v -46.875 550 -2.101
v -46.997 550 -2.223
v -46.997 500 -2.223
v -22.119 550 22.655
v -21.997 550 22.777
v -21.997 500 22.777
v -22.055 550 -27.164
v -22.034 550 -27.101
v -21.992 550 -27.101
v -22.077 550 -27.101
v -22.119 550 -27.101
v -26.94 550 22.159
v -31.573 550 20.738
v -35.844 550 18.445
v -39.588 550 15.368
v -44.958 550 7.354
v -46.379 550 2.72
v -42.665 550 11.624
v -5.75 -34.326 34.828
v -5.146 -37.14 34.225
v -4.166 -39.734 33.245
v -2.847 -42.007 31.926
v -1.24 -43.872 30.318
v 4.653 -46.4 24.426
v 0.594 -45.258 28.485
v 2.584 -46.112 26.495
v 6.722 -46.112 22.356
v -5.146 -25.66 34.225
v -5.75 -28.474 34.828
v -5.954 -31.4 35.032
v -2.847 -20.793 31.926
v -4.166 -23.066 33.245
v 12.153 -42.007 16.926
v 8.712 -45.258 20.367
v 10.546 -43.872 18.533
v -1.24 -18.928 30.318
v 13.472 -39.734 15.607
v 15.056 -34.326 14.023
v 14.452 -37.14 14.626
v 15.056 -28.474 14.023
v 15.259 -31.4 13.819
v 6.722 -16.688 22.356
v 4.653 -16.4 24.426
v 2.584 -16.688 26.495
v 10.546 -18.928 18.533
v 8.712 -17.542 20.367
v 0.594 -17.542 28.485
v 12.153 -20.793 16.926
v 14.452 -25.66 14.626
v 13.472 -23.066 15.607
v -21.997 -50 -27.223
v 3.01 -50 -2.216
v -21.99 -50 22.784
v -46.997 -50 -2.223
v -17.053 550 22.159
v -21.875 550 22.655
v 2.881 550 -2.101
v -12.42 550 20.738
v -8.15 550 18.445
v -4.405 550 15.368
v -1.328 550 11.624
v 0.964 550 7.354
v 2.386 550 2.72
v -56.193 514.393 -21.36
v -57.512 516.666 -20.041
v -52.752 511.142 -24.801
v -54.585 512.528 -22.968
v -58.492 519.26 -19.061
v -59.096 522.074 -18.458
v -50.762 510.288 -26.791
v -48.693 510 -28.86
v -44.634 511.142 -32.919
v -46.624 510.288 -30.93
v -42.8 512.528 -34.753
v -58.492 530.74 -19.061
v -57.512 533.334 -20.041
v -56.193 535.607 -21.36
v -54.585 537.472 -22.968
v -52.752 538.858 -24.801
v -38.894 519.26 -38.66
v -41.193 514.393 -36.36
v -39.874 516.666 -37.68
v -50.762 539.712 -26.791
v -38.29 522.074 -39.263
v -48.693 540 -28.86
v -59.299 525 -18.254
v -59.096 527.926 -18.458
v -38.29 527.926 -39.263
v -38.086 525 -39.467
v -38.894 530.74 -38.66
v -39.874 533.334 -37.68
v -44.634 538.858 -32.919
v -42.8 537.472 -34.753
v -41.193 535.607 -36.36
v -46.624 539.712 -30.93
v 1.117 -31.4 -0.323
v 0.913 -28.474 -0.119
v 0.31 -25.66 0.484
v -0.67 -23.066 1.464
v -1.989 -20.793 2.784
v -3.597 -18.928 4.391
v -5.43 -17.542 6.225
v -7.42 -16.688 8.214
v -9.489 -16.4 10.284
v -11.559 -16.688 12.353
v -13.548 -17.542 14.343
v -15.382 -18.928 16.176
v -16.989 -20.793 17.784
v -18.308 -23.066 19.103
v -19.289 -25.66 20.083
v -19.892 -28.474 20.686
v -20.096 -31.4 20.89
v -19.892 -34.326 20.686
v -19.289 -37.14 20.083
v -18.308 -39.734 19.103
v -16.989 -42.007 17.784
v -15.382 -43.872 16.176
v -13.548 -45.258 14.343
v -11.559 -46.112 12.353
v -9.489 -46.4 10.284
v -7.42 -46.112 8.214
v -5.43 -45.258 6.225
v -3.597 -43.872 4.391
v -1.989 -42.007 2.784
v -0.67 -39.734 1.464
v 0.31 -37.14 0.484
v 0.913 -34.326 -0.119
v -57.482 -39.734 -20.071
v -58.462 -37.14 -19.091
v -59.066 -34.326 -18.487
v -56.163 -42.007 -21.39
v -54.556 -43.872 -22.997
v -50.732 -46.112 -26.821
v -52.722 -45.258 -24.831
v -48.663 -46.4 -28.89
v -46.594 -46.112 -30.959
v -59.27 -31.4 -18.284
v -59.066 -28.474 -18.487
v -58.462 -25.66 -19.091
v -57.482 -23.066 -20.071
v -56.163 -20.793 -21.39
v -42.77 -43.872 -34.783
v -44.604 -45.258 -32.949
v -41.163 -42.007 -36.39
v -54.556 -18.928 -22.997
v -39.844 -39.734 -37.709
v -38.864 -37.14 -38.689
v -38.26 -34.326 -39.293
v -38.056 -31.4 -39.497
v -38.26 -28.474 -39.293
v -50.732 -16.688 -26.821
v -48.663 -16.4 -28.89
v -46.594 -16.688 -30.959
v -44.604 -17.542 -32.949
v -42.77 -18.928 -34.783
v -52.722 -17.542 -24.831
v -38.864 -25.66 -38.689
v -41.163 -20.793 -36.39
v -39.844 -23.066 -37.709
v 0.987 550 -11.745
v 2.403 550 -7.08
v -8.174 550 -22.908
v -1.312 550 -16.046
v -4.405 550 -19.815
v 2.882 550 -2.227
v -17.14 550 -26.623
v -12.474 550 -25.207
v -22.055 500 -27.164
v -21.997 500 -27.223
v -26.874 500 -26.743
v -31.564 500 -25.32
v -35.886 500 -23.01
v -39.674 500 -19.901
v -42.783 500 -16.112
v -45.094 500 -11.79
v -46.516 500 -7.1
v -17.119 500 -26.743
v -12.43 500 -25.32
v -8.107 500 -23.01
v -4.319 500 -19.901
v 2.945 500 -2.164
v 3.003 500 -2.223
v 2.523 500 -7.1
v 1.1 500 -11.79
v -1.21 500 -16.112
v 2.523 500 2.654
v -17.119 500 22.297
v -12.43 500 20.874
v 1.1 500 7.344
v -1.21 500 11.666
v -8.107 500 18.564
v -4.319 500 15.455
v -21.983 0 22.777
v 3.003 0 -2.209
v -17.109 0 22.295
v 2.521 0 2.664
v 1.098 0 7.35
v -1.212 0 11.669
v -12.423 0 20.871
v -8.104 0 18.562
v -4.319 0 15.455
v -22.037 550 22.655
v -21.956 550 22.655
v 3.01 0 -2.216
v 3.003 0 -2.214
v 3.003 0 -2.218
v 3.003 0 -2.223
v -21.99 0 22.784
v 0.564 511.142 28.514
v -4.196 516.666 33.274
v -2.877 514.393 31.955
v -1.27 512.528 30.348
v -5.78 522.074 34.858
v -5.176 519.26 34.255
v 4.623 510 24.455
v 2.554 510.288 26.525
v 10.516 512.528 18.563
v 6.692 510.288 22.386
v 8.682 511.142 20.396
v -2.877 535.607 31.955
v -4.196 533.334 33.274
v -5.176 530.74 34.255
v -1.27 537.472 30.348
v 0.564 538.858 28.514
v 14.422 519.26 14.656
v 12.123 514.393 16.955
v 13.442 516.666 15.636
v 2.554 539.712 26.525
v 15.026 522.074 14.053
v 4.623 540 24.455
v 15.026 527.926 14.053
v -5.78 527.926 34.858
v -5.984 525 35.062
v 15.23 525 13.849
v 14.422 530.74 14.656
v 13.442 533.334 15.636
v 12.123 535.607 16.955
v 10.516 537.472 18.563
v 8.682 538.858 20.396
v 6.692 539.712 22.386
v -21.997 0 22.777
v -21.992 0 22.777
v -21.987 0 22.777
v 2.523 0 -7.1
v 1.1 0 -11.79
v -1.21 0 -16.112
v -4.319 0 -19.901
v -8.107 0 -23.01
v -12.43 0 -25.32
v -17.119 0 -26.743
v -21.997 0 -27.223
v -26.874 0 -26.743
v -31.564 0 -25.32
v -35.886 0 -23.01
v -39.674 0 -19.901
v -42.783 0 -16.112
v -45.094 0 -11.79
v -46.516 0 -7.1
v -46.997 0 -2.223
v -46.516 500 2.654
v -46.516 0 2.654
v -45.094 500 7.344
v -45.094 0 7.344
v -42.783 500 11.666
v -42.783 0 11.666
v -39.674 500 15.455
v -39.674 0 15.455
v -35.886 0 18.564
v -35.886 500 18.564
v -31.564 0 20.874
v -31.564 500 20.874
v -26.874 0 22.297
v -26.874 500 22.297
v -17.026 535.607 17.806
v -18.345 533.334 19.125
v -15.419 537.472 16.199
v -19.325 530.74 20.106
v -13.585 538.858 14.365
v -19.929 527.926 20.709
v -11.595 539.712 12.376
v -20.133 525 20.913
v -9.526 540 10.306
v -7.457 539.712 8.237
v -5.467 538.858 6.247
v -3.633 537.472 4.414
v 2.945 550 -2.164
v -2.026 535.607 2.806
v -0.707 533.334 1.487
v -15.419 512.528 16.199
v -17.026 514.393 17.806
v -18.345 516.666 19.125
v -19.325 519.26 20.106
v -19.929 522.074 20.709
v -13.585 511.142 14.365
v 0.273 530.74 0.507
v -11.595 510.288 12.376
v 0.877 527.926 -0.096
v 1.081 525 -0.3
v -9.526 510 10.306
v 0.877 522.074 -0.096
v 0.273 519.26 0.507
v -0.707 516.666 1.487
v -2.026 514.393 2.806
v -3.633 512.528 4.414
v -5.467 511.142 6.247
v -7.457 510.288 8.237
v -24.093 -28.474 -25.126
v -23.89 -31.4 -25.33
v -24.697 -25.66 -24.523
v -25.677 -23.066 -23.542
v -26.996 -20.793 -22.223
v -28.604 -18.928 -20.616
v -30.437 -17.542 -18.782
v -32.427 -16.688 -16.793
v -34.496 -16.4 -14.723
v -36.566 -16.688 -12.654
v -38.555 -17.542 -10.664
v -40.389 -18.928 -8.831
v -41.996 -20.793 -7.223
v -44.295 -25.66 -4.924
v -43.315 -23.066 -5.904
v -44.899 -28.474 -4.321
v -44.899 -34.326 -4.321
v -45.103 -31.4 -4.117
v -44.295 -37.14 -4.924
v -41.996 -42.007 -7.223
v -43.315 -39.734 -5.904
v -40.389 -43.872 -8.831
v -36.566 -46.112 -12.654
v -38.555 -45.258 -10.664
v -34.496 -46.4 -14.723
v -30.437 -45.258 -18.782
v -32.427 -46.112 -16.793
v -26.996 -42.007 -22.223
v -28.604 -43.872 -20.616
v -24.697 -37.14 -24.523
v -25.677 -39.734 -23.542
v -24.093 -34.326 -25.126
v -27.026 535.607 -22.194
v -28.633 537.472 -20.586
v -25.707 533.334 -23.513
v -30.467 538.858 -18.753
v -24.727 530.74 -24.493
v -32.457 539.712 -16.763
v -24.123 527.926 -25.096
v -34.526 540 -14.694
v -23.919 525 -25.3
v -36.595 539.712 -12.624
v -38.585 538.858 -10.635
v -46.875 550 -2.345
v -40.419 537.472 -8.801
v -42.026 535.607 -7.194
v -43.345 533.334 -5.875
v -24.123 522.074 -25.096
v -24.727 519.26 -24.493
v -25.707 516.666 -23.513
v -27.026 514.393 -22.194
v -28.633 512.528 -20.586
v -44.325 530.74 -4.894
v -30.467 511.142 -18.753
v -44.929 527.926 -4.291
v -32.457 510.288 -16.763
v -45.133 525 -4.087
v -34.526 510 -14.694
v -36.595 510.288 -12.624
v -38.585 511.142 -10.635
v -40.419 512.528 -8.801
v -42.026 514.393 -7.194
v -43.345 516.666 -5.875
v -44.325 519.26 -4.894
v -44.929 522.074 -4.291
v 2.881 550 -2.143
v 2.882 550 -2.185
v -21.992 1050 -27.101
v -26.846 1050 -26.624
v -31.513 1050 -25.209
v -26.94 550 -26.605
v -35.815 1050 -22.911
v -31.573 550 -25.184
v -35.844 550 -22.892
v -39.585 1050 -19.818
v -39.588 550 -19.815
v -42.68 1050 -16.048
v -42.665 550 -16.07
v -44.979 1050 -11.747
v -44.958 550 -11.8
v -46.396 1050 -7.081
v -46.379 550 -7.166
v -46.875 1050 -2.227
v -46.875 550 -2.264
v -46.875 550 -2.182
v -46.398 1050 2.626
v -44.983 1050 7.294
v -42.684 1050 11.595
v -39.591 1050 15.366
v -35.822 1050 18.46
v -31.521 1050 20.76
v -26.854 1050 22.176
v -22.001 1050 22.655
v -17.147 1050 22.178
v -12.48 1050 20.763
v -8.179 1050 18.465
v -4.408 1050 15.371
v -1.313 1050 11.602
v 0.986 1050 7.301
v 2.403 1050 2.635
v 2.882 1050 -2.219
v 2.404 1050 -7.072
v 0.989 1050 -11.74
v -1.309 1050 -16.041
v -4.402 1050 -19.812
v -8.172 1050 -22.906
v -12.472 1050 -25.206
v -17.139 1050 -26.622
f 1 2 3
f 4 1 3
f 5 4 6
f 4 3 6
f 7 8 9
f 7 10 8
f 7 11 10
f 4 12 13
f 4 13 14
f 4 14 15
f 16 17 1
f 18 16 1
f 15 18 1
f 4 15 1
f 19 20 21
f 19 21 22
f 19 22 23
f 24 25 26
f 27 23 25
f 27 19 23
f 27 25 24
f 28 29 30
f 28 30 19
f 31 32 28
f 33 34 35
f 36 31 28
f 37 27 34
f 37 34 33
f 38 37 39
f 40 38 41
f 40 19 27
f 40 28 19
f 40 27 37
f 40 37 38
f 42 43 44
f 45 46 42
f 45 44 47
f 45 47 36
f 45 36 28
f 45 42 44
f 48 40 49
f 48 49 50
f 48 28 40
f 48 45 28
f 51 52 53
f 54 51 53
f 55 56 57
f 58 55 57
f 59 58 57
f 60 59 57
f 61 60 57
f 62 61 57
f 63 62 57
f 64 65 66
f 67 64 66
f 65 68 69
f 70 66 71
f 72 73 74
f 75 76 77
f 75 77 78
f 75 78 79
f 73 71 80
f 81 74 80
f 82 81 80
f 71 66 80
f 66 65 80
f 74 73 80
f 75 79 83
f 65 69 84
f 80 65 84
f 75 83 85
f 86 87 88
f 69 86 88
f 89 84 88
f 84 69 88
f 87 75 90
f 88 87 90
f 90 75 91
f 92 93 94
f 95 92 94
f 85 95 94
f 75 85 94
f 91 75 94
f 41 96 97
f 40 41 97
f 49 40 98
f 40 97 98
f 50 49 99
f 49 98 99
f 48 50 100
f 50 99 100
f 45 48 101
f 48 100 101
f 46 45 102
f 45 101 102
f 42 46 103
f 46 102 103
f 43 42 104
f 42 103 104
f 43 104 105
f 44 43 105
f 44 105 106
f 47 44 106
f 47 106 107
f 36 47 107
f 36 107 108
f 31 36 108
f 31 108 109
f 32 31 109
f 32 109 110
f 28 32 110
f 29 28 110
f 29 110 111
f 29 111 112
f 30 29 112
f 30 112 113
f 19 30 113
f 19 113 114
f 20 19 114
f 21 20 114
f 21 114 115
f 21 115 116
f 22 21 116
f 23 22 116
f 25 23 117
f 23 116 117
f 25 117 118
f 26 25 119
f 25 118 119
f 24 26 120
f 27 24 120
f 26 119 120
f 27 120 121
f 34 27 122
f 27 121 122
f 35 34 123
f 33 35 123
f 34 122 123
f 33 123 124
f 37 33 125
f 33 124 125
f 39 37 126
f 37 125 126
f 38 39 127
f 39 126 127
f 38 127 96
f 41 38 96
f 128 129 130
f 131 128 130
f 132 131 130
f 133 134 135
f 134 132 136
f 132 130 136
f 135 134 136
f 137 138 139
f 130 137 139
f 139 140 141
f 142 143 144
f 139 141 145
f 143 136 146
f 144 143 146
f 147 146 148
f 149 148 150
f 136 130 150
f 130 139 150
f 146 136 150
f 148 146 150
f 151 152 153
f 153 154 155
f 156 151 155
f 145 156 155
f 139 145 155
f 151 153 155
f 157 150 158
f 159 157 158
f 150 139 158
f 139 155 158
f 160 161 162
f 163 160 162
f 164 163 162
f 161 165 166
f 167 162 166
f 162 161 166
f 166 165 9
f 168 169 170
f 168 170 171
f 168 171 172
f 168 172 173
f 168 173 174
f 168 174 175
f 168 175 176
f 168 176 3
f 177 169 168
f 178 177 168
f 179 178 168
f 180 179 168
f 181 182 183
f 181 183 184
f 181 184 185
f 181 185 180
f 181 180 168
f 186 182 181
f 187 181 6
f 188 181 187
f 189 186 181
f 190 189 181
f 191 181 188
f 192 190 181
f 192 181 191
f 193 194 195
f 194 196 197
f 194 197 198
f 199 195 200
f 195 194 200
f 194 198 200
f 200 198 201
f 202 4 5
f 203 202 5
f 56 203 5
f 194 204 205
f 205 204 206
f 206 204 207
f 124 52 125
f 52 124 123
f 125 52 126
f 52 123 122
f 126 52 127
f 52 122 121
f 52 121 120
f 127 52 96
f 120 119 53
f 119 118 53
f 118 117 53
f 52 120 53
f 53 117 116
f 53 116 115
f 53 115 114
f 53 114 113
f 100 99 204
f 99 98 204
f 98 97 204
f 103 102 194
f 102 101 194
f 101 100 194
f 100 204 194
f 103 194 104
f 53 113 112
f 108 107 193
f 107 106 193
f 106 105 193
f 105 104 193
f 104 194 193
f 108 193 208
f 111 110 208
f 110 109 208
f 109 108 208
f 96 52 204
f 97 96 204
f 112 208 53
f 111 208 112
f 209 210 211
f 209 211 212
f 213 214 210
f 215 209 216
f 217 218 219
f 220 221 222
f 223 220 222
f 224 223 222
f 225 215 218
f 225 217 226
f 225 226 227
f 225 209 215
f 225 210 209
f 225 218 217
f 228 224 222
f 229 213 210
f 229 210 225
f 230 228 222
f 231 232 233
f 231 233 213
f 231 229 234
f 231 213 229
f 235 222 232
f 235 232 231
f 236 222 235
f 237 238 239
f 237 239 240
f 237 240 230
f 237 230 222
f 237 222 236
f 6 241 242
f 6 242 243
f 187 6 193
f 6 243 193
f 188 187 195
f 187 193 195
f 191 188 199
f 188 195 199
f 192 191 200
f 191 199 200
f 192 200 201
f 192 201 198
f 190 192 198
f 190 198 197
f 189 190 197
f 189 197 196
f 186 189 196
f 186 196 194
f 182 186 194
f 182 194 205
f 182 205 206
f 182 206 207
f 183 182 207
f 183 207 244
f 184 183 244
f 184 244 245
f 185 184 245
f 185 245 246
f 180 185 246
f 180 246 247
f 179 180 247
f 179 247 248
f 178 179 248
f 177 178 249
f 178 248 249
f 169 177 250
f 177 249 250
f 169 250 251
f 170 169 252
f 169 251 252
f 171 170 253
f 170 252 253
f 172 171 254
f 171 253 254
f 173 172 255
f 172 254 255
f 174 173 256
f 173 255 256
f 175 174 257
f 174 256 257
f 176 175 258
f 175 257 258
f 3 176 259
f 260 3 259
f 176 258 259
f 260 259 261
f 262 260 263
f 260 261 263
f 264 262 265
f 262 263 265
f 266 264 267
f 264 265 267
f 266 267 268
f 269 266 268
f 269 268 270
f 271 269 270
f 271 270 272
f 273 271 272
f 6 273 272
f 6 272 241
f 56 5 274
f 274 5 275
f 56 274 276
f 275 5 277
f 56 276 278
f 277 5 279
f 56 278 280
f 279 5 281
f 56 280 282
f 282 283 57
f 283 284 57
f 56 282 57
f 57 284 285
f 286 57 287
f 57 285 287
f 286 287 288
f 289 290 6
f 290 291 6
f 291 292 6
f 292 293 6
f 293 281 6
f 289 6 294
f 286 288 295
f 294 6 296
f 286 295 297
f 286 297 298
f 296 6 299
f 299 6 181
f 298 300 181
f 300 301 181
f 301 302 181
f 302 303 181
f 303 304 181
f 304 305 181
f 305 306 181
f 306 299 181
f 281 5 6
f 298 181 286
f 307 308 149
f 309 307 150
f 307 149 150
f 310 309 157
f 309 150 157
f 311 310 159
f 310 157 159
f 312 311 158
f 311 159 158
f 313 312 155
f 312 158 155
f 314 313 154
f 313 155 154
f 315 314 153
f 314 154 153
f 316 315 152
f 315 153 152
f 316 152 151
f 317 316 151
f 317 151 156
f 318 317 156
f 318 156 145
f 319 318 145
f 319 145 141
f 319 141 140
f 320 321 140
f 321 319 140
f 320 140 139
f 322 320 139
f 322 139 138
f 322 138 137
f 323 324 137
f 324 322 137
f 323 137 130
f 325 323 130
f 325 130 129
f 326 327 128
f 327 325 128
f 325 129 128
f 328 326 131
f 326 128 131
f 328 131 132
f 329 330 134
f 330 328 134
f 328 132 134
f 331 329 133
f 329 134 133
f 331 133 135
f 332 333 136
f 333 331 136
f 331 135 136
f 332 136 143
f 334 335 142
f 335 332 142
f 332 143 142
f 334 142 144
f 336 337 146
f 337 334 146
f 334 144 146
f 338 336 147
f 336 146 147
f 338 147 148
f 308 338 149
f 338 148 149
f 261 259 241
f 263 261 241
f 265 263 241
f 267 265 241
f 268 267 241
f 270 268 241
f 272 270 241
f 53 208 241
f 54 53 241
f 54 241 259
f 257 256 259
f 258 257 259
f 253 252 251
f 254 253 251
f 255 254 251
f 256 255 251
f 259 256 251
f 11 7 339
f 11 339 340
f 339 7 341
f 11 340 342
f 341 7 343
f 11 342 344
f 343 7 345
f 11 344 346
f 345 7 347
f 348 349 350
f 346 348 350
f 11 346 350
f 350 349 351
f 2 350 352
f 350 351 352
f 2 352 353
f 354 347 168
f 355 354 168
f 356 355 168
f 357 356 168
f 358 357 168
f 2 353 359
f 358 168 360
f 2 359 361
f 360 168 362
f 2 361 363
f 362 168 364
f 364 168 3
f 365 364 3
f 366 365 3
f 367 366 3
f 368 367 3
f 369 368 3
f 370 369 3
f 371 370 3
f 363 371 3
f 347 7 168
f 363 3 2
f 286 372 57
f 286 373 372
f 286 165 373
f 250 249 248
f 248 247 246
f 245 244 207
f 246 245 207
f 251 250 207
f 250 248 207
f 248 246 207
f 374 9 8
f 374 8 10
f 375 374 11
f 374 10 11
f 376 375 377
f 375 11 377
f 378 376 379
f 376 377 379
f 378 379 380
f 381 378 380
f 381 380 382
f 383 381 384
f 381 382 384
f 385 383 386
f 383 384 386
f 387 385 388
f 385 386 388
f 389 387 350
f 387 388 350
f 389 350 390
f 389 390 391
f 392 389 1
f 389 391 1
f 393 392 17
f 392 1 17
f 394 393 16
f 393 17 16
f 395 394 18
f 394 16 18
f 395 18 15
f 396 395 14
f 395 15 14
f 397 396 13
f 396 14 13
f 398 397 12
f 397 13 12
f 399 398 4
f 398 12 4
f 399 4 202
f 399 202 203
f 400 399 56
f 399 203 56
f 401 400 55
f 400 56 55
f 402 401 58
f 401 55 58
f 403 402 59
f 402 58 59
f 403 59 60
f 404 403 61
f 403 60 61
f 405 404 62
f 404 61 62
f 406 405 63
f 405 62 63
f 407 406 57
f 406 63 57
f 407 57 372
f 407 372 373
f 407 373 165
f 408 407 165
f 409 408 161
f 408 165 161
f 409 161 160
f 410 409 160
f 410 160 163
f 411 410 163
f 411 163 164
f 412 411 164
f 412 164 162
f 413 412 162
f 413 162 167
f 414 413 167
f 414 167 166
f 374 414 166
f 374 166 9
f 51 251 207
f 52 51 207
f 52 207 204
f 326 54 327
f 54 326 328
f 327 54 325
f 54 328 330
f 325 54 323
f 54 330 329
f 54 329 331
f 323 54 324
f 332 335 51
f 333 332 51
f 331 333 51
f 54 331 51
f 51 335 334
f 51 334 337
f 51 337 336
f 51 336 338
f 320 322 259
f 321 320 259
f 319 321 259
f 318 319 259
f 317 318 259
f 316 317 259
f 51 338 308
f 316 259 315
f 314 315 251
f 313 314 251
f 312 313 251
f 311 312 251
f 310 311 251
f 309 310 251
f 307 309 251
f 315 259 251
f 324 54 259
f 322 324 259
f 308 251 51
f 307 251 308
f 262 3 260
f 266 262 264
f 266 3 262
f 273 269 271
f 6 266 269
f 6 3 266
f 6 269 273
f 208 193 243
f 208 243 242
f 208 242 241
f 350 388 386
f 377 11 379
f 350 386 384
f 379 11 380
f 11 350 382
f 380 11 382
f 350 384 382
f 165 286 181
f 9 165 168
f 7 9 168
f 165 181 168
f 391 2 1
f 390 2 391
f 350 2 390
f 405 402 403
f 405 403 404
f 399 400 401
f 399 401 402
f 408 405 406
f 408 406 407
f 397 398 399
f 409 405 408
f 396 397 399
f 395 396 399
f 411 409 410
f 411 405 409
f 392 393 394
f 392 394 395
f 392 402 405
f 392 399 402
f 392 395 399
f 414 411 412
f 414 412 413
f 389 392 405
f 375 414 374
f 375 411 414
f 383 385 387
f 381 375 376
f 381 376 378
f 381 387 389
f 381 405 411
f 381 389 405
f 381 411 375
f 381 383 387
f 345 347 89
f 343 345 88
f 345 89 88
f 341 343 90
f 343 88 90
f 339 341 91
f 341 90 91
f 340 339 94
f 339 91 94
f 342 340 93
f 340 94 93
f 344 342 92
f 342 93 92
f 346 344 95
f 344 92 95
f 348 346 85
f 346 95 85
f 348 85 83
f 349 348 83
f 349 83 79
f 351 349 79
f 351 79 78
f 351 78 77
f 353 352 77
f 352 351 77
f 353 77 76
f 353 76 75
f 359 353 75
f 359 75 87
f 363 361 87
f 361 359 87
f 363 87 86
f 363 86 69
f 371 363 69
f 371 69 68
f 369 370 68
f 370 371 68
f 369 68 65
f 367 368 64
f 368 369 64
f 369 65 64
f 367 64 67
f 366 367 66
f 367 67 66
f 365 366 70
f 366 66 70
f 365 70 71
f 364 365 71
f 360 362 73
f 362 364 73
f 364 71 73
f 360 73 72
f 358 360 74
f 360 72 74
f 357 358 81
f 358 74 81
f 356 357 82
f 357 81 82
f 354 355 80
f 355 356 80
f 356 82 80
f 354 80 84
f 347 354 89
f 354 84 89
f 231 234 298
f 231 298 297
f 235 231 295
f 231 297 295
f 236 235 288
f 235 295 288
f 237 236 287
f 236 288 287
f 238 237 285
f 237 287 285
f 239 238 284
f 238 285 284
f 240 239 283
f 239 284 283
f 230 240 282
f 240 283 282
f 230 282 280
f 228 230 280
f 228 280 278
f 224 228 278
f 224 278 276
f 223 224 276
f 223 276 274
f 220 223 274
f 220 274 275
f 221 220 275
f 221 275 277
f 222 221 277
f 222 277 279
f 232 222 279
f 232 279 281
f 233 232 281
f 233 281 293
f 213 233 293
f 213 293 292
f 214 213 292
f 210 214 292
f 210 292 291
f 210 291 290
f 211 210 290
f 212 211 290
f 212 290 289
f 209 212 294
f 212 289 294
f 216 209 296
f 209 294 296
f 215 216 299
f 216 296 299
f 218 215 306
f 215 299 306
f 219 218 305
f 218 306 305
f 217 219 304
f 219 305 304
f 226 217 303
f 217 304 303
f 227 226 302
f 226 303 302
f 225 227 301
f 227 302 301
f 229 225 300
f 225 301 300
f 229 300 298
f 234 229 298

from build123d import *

# Parameters (mm, degrees)
SKETCH1_R                = 25
BOSS_EXTRUDE1_DEPTH      = 500
BOSS_EXTRUDE2_DEPTH      = 50
BOSS_EXTRUDE3_DEPTH      = 50
BOSS_EXTRUDE5_DEPTH      = 20
BOSS_EXTRUDE5_DEPTH_BACK = 55.4
SKETCH5_R                = 15
SKETCH8_R                = 24.878201485
BOSS_EXTRUDE6_DEPTH      = 500


with BuildPart() as part:
    # Sketch1 → Boss-Extrude1 (new body)
    with BuildSketch(Plane(origin=(0, 0, 0), x_dir=(1, 0, 0), z_dir=(0, 1, 0))):
        with Locations(Location((-21.996605786, 2.223061223, 0), (0, 0, 270))):
            Circle(SKETCH1_R)
    extrude(amount=BOSS_EXTRUDE1_DEPTH)

    # Sketch3 → Boss-Extrude2 (add)
    with BuildSketch(Plane(origin=(0, 500, 0), x_dir=(1, 0, 0), z_dir=(0, 1, 0))):
        Polygon((-46.996605786, 2.223061223), (-21.996605786, -22.776938777), (2.944600987, 2.164267995), (-22.055399013, 27.164267995), align=None)
    extrude(amount=BOSS_EXTRUDE2_DEPTH)

    # Sketch4 → Boss-Extrude3 (add)
    with BuildSketch(Plane(origin=(0, 0, 0), x_dir=(-1, 0, 0), z_dir=(0, -1, 0))):
        Polygon((46.996605786, 2.223061223), (21.996605786, 27.223061223), (-3.010340521, 2.216114917), (21.989659479, -22.783885083), align=None)
    extrude(amount=BOSS_EXTRUDE3_DEPTH)

    # Sketch5 → Boss-Extrude5 (add, two sides: drawn at the far end of the back side and taken through both)
    with BuildSketch(Plane(origin=(0.397112802, 0, 0.397112802), x_dir=(0.7071067811865474, 0, -0.7071067811865477), z_dir=(0.7071067811865477, 0, 0.7071067811865474)).offset(-BOSS_EXTRUDE5_DEPTH_BACK)):
        with Locations((-13.981523689, -31.399998411)):
            Circle(SKETCH5_R)
        with Locations((-14.023580538, 525)):
            Circle(SKETCH5_R)
    extrude(amount=BOSS_EXTRUDE5_DEPTH + BOSS_EXTRUDE5_DEPTH_BACK)

    # Sketch8 → Boss-Extrude6 (add)
    with BuildSketch(Plane(origin=(0, 550, 0), x_dir=(1, 0, 0), z_dir=(0, 1, 0))):
        with Locations(Location((-21.996605786, 2.223061223, 0), (0, 0, 89.990298588))):
            Circle(SKETCH8_R)
    extrude(amount=BOSS_EXTRUDE6_DEPTH)


solid = part.part
